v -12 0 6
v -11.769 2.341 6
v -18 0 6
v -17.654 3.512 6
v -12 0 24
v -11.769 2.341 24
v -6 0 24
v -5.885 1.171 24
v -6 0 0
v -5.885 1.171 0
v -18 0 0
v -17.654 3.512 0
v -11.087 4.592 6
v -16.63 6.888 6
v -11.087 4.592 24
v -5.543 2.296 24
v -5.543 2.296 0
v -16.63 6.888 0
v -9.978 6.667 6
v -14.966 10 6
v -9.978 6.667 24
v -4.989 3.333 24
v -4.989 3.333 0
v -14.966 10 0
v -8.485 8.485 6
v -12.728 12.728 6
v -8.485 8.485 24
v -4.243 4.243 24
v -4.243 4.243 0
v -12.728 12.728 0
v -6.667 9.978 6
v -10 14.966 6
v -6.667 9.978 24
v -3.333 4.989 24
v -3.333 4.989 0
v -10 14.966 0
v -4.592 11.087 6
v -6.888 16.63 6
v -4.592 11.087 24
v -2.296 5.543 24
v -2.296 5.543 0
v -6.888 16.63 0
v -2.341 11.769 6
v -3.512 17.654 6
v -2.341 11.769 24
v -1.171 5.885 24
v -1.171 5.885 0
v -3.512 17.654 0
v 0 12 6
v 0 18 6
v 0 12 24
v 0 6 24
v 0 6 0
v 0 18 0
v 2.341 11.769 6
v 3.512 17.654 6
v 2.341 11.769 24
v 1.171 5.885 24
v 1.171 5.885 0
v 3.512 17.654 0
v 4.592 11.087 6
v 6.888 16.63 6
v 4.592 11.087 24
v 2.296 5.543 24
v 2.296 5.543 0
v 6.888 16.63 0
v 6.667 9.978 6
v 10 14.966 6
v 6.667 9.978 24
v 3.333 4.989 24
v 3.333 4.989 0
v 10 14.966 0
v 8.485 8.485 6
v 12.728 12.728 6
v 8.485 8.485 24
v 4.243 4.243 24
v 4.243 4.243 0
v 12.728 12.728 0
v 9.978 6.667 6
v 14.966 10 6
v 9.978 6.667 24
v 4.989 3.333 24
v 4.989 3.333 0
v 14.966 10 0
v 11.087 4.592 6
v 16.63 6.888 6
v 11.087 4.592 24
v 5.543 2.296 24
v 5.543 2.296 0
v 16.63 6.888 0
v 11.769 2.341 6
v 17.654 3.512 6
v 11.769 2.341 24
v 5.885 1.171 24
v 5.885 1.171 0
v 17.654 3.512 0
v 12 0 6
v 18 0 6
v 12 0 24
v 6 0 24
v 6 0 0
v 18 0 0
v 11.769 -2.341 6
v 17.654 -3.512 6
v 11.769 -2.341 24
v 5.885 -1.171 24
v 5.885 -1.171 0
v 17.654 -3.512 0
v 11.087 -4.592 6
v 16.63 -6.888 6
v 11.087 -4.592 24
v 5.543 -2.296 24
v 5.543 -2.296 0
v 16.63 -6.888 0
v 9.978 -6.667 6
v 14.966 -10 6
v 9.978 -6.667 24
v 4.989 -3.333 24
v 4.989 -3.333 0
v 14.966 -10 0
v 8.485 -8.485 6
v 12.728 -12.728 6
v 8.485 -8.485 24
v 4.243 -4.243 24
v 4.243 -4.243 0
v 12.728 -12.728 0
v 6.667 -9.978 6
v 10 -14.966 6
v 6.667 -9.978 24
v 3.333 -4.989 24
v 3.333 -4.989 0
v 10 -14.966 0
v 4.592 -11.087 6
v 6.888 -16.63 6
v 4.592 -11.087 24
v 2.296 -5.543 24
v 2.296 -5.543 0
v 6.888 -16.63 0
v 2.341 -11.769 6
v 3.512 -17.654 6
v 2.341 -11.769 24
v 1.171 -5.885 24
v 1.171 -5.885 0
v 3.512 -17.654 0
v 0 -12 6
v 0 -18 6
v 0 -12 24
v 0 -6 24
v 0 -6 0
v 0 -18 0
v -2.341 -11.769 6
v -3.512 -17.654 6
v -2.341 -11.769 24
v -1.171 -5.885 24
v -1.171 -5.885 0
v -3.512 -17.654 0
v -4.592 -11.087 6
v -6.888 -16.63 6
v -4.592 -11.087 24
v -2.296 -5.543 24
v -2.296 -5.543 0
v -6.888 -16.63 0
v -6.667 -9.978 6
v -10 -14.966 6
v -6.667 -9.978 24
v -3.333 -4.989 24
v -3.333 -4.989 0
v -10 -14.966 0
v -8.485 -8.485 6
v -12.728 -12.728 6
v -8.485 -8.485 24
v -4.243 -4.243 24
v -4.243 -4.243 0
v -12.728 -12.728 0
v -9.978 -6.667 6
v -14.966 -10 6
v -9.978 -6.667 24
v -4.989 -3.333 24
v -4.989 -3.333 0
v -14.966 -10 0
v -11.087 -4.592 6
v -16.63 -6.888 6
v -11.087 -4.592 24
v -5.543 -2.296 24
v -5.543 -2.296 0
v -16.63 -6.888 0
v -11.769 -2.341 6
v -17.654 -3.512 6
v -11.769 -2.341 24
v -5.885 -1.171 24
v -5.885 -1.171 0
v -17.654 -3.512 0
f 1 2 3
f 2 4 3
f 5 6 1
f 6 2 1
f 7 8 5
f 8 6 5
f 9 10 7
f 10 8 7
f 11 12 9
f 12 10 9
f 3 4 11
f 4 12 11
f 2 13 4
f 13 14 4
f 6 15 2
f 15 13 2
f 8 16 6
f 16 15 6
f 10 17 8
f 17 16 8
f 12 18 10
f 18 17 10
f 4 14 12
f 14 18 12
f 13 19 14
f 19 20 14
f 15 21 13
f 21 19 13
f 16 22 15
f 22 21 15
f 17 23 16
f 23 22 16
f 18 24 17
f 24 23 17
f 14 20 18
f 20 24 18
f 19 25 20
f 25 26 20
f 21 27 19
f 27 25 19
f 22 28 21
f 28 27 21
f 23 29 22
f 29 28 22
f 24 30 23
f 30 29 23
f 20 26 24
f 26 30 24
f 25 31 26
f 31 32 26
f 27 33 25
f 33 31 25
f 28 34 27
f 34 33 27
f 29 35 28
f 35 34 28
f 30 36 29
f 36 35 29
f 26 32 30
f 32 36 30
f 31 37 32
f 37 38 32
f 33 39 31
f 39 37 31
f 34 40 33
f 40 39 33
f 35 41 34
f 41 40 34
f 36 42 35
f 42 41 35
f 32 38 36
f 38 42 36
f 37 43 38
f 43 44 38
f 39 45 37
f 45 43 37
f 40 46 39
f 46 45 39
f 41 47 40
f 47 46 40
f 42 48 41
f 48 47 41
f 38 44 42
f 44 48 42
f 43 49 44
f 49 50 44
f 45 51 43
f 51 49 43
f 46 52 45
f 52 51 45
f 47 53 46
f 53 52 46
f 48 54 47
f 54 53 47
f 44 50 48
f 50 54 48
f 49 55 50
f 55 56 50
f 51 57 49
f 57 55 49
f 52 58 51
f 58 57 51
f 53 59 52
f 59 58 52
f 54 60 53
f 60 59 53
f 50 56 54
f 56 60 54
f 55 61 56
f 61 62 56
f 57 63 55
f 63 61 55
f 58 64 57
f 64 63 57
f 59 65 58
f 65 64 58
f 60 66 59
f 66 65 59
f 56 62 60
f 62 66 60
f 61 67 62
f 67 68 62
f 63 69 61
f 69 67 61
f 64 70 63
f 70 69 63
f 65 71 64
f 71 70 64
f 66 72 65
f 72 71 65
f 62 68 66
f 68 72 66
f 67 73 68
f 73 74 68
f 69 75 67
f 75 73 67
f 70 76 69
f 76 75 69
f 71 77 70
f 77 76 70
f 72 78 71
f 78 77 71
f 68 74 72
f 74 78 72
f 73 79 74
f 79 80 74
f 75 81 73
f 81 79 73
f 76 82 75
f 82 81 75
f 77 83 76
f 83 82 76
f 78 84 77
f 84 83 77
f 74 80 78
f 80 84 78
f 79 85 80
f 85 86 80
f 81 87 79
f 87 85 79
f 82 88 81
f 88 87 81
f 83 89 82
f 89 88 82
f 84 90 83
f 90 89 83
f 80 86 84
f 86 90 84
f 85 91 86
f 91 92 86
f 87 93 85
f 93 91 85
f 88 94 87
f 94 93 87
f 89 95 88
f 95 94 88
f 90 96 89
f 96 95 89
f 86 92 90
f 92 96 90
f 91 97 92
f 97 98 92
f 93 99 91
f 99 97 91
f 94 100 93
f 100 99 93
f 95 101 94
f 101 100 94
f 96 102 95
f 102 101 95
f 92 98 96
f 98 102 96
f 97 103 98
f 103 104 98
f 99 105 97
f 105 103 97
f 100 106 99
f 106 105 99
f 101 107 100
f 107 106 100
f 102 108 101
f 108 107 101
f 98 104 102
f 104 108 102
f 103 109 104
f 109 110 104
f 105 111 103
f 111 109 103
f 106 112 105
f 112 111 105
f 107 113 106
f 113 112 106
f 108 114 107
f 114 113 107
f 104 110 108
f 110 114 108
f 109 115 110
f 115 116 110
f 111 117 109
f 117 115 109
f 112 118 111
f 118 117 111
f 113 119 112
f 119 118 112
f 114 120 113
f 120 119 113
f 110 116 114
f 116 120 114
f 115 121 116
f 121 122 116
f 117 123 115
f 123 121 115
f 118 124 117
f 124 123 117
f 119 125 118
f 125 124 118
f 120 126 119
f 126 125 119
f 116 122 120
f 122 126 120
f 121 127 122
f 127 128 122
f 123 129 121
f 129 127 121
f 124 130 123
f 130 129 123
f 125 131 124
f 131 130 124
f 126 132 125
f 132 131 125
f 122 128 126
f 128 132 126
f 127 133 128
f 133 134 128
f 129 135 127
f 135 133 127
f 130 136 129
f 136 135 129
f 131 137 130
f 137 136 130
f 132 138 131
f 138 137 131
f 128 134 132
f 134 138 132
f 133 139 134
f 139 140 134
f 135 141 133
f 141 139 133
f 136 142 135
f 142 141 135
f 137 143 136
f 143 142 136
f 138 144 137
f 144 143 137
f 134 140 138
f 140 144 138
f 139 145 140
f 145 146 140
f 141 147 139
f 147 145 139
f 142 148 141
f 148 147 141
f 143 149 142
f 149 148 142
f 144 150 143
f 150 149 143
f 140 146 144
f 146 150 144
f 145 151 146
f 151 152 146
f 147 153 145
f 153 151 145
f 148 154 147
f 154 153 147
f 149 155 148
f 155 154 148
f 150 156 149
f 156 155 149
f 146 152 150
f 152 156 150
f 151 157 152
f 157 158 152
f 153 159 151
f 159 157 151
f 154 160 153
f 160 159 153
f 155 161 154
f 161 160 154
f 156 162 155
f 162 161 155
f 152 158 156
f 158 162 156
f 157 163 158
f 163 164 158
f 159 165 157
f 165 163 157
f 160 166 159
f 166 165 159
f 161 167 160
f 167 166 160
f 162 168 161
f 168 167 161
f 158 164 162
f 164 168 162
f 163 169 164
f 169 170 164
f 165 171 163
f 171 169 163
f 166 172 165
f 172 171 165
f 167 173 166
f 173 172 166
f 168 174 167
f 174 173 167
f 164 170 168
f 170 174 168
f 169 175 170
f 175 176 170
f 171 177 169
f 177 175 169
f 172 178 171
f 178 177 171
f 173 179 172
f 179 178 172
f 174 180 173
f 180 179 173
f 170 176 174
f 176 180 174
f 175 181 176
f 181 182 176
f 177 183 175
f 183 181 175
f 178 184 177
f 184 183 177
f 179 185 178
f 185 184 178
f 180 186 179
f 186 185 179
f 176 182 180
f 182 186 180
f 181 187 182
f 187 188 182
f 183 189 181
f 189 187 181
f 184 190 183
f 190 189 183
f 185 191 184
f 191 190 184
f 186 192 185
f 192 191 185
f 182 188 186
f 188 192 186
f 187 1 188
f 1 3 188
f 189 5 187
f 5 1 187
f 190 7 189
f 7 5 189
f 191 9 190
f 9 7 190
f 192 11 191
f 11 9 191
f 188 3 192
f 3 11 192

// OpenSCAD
$fn = 32;

// ----------------------------------------------------------------------
// Revolved part: flanged bushing R18
// ----------------------------------------------------------------------

// --- parameters (mm) ---
bore_r = 6;               // bore radius
flange_r = 18;            // flange radius
flange_h = 6;             // flange thickness
sleeve_r = 12;            // sleeve radius
total_h = 24;             // overall height
revolve_angle = 360;      // revolve sweep, degrees

bore_d = 2 * bore_r;
flange_d = 2 * flange_r;
sleeve_d = 2 * sleeve_r;

profile = [[6, 0], [18, 0], [18, 6], [12, 6], [12, 24], [6, 24]];  // primary outline, 6 points, counter clockwise

// --- the one profile operation ---
rotate_extrude(angle = revolve_angle) polygon(points = profile);
